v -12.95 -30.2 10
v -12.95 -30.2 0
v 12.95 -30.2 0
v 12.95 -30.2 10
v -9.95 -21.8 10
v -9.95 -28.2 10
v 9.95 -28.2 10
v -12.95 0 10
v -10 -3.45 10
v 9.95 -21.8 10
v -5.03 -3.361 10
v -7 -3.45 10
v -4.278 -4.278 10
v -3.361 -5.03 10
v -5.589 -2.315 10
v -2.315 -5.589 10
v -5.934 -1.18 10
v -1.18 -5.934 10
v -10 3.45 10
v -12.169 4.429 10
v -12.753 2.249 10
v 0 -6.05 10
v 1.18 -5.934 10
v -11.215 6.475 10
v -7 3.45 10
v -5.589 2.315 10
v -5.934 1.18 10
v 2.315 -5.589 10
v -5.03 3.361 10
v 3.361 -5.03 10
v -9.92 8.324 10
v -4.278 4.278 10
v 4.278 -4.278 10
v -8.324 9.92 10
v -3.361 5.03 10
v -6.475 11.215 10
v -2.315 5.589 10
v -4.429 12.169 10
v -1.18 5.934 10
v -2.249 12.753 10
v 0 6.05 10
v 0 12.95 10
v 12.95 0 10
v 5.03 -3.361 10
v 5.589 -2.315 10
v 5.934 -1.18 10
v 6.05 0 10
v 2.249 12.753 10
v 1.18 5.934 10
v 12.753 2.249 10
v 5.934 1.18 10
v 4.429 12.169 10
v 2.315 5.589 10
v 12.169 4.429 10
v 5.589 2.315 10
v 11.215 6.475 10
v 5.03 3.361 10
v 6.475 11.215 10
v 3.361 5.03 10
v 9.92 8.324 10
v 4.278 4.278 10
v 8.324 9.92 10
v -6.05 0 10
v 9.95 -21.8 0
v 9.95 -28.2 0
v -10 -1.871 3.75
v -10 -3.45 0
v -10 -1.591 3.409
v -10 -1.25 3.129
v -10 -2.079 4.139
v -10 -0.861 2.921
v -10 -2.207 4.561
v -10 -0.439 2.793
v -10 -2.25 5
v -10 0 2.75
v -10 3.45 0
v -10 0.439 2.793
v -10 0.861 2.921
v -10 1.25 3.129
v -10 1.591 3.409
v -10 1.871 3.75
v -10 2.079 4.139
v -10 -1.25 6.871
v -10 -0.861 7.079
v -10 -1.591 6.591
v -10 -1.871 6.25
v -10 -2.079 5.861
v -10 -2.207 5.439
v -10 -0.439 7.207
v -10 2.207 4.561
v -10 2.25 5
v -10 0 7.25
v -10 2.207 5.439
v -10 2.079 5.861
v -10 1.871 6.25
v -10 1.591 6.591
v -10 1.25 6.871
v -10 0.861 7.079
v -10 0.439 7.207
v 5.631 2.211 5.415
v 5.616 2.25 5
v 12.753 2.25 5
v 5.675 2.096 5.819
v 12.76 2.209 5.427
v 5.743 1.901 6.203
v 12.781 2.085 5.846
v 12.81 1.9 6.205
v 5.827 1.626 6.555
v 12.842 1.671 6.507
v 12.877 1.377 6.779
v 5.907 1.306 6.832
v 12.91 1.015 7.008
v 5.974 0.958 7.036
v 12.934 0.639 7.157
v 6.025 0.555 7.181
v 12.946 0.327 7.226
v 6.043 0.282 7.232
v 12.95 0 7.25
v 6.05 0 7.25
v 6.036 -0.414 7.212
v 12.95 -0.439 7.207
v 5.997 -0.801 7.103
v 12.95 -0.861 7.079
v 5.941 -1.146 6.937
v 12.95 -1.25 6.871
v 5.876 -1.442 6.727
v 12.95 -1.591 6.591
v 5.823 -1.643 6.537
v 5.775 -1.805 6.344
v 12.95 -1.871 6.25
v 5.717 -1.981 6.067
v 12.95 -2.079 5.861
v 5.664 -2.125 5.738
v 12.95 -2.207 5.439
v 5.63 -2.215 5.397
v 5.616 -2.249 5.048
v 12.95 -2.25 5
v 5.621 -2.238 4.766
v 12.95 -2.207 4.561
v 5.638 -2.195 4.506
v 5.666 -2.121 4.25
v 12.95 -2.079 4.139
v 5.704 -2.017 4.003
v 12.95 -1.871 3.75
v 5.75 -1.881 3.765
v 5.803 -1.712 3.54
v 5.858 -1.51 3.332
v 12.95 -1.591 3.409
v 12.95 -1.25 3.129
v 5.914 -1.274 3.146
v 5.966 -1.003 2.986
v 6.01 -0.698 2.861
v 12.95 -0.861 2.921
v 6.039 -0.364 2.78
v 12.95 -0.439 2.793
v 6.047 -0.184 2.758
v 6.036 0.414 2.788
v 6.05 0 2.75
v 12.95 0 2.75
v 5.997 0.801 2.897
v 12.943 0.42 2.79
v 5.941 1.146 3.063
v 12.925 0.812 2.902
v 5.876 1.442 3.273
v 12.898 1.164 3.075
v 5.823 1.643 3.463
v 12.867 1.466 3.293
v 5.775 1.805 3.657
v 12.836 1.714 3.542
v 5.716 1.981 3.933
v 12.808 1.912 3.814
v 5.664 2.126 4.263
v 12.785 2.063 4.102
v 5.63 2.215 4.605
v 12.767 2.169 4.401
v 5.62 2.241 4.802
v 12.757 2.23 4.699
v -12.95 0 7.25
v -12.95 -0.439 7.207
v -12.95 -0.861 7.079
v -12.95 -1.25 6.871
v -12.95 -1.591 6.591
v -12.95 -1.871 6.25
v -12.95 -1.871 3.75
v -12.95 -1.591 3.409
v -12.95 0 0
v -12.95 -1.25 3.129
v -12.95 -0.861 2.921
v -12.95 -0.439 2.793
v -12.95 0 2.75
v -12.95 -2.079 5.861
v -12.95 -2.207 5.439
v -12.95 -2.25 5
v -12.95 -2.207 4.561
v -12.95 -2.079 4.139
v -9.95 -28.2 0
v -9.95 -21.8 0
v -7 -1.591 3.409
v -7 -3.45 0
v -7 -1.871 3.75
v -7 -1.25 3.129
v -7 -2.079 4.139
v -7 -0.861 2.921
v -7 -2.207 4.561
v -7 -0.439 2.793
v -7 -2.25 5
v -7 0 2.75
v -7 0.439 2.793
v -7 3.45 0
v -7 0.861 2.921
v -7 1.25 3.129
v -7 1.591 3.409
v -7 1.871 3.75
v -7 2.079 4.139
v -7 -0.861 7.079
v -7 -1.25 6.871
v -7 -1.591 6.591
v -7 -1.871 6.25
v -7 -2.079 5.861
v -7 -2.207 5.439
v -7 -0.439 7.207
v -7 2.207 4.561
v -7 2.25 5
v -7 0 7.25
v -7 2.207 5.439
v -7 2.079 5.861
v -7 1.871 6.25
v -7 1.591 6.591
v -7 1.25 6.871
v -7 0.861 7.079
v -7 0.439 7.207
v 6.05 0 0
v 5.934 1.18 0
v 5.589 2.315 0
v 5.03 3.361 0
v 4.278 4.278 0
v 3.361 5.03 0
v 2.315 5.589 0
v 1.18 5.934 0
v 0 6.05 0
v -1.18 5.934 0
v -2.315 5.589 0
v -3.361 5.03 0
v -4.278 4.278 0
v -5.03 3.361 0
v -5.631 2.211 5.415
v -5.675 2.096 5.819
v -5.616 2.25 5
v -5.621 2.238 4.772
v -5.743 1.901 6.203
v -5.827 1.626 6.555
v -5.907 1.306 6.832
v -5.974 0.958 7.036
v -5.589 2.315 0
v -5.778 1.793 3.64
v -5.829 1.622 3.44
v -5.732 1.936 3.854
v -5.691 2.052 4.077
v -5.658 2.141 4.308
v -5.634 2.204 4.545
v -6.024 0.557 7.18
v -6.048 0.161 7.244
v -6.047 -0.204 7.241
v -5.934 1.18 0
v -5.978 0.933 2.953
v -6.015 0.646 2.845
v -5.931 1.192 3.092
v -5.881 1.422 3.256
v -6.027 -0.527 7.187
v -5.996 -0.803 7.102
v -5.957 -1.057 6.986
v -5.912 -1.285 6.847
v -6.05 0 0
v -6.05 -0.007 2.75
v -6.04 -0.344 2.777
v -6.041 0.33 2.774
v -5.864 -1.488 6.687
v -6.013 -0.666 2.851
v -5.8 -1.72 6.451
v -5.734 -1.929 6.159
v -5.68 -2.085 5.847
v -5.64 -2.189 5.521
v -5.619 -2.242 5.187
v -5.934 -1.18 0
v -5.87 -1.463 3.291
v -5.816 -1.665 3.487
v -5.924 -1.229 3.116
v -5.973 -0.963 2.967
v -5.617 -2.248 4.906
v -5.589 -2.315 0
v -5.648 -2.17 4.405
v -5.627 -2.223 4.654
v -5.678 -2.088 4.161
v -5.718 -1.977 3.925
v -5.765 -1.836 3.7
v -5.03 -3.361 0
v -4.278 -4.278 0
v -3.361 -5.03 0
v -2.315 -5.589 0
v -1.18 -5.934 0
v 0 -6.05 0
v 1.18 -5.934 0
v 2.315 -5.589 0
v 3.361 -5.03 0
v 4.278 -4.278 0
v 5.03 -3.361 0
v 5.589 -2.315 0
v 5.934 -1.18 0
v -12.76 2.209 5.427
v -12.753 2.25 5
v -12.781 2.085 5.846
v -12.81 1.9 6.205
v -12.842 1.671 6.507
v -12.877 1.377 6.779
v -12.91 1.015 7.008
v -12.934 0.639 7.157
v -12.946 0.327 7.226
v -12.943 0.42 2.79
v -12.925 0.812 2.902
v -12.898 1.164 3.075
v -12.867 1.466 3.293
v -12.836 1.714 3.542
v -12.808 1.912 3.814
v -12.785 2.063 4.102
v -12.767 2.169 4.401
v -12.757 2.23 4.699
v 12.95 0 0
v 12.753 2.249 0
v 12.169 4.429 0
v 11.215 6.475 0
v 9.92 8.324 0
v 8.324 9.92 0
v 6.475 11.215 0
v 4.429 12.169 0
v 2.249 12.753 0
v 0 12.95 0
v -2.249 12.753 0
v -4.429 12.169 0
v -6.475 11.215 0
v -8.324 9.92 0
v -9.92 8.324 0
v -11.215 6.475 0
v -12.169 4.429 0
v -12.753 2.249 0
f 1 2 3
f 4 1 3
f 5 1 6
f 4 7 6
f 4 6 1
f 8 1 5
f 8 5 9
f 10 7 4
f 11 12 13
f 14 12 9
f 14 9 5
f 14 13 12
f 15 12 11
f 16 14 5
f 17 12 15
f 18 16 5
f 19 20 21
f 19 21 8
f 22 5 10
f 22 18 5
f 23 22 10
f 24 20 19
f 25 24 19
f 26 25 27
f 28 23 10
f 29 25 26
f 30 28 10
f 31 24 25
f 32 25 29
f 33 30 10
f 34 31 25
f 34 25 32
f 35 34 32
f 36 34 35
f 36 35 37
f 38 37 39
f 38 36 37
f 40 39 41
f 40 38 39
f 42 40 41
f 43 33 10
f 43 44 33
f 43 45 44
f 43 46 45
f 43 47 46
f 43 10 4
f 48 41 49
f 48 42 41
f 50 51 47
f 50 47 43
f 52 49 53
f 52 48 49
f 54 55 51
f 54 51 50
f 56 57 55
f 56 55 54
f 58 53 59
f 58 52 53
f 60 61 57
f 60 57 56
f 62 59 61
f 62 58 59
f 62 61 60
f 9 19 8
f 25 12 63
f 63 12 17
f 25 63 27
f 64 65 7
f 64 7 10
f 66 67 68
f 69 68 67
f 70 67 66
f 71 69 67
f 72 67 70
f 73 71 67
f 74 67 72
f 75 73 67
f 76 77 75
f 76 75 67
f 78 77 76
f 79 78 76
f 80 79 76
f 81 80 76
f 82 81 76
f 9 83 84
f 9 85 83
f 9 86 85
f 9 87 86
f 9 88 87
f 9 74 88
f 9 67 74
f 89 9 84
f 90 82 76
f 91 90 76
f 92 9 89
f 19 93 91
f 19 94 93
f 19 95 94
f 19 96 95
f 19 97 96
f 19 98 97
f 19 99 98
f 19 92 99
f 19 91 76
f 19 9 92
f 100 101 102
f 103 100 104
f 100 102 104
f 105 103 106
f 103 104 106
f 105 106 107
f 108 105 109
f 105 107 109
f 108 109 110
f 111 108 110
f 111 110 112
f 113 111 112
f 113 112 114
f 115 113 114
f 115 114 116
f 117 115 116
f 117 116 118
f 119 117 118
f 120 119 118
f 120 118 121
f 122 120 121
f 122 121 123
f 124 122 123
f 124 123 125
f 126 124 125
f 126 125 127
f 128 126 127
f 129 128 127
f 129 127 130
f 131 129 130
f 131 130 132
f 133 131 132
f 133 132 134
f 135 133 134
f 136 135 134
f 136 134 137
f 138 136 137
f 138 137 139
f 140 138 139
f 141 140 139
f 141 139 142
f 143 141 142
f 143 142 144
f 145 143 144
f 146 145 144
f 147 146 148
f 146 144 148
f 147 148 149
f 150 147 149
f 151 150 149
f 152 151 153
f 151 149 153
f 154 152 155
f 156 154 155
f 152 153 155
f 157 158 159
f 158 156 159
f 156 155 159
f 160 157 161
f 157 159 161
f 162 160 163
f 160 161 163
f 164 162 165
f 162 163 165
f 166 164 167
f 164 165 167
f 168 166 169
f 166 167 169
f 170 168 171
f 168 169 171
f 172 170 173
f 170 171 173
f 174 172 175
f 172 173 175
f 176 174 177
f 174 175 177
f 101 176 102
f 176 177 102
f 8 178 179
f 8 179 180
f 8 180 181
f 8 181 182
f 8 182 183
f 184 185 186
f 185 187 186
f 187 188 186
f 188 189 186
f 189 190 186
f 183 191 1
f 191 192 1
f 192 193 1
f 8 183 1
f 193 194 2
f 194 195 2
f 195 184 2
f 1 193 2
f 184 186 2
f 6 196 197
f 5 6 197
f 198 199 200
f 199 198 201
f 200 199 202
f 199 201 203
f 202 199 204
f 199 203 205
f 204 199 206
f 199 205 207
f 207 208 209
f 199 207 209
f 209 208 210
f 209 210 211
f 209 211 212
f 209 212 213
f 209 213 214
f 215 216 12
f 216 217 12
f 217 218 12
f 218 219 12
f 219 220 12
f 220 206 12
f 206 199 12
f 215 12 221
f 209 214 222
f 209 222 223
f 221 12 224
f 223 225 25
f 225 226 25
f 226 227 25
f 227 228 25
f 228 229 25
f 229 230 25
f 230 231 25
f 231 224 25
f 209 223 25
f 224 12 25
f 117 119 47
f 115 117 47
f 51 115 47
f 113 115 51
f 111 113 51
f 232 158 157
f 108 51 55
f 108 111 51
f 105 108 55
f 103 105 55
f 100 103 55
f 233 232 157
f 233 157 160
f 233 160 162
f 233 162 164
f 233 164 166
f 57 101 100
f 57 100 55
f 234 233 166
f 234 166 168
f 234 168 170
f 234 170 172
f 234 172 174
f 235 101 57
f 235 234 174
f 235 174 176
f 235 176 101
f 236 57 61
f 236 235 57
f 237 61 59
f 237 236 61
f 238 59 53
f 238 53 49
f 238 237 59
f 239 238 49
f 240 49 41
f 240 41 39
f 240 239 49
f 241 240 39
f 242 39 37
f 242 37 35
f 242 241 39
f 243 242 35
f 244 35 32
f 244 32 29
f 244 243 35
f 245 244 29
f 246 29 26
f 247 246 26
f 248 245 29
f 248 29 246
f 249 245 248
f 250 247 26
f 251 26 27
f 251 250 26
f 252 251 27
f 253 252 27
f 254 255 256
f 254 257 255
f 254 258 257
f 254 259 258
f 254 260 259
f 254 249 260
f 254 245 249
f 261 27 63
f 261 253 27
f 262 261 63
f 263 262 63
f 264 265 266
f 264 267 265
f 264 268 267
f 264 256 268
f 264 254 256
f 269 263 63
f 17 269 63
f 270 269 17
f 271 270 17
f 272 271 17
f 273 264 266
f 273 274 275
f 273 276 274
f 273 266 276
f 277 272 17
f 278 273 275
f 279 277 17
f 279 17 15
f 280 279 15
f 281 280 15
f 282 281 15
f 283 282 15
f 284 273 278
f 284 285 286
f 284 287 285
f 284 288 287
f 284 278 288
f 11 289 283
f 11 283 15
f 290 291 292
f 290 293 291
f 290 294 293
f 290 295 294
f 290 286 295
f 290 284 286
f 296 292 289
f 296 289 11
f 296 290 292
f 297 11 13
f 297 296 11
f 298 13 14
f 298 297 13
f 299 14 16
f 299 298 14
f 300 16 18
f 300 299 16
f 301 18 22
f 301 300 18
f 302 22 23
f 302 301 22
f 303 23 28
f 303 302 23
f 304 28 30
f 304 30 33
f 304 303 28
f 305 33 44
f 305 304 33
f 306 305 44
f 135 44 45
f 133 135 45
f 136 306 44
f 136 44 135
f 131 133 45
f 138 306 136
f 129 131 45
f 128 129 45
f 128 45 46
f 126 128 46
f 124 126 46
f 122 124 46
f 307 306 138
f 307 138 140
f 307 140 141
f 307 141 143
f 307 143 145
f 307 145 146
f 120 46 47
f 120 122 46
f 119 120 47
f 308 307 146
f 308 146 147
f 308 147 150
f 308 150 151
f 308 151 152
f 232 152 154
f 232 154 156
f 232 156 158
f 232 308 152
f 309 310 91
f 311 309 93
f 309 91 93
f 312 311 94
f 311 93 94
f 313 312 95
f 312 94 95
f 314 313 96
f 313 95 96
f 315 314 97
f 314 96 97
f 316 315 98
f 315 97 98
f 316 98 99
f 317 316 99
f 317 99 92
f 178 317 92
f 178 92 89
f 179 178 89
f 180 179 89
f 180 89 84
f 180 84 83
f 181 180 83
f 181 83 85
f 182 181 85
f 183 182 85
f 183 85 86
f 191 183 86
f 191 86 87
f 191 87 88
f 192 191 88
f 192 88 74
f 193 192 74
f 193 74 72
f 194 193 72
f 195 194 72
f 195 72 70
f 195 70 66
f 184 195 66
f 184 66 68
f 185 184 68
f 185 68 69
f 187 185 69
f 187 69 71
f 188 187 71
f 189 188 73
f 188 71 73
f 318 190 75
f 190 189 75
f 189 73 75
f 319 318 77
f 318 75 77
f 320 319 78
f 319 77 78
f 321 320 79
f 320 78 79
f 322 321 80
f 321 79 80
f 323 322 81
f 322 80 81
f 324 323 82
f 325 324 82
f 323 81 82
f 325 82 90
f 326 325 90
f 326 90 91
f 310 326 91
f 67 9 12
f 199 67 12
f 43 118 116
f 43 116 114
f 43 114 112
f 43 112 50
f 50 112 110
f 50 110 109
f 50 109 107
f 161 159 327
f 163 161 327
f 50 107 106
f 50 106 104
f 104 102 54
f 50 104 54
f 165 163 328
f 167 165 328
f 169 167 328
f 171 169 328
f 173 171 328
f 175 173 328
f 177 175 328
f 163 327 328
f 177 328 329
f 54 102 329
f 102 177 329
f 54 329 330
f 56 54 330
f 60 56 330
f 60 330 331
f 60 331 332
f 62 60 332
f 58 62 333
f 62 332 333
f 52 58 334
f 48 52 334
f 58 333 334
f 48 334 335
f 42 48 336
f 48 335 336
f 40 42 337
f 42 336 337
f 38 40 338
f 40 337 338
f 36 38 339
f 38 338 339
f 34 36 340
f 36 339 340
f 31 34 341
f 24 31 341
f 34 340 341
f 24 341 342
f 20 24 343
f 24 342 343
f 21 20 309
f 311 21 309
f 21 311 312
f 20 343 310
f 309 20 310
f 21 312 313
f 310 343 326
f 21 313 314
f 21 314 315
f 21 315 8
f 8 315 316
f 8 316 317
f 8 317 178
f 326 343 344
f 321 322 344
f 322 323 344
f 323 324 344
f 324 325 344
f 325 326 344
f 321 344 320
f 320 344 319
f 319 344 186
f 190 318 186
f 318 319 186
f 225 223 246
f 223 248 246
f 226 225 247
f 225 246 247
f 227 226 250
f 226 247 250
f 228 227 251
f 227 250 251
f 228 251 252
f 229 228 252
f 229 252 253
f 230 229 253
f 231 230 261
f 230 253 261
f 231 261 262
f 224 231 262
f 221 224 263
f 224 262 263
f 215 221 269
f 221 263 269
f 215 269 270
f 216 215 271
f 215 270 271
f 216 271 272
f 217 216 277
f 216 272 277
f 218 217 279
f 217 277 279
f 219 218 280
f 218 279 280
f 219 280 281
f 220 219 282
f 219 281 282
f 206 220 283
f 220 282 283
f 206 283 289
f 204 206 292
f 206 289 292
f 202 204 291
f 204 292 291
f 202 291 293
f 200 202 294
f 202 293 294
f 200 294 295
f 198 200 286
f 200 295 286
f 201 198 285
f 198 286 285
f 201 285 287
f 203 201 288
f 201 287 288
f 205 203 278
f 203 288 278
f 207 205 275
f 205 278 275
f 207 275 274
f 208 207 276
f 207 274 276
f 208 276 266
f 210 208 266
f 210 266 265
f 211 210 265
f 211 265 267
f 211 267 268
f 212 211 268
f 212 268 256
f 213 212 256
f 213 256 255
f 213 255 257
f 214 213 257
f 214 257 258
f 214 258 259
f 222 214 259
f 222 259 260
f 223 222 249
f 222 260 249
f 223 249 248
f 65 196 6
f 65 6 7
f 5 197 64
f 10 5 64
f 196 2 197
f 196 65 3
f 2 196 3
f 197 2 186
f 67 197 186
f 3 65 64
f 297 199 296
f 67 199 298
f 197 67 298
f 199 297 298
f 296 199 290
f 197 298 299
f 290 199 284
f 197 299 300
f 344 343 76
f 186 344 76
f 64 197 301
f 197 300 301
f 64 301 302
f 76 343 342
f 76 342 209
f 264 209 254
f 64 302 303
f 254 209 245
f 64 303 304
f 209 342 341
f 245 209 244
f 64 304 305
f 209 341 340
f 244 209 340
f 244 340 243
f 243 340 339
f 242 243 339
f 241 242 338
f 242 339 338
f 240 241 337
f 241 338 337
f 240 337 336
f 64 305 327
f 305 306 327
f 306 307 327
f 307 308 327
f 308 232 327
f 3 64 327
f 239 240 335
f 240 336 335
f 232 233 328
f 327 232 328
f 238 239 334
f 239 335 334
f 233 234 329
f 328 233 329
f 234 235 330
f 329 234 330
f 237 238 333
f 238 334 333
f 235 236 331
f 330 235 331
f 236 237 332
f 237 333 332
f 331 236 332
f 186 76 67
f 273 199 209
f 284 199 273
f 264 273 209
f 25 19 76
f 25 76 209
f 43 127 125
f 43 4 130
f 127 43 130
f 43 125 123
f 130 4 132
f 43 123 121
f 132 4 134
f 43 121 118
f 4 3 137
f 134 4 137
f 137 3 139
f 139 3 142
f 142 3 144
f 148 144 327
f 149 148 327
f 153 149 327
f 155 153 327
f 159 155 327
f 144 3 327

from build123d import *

# Parameters (mm, degrees)
SKETCH_R        = 6.05
SKETCH_W        = 19.9
SKETCH_H        = 6.4
PAD_DEPTH       = 10
SKETCH002_W     = 3
SKETCH002_H     = 6.9
POCKET001_DEPTH = 12
SKETCH003_R     = 2.25
POCKET_DEPTH    = 6
SKETCH004_R     = 2.25
POCKET002_DEPTH = 25.901


with BuildPart() as part:
    # Sketch → Pad (new body)
    with BuildSketch(Plane.XY):
        with BuildLine():
            ThreePointArc((12.95, 0), (0, 12.95), (-12.95, 0))
            Line((-12.95, 0), (-12.95, -30.2))
            Line((-12.95, -30.2), (12.95, -30.2))
            Line((12.95, -30.2), (12.95, 0))
        make_face()
        Circle(SKETCH_R, mode=Mode.SUBTRACT)
        with Locations((0, -25)):
            Rectangle(SKETCH_W, SKETCH_H, mode=Mode.SUBTRACT)
    extrude(amount=PAD_DEPTH)

    # Sketch002 → Pocket001 (cut)
    with BuildSketch(Plane.XY.offset(10)):
        with Locations((-8.5, 0)):
            Rectangle(SKETCH002_W, SKETCH002_H)
    extrude(amount=-POCKET001_DEPTH, mode=Mode.SUBTRACT)

    # Sketch003 → Pocket (cut, symmetric)
    with BuildSketch(Plane.YZ.offset(-9.95)):
        with Locations((0, 5)):
            Circle(SKETCH003_R)
    extrude(amount=POCKET_DEPTH, both=True, mode=Mode.SUBTRACT)

    # Sketch004 → Pocket002 (cut, through all)
    with BuildSketch(Plane.YZ.offset(12.95)):
        with Locations((0, 5)):
            Circle(SKETCH004_R)
    extrude(amount=-POCKET002_DEPTH, mode=Mode.SUBTRACT)


solid = part.part
